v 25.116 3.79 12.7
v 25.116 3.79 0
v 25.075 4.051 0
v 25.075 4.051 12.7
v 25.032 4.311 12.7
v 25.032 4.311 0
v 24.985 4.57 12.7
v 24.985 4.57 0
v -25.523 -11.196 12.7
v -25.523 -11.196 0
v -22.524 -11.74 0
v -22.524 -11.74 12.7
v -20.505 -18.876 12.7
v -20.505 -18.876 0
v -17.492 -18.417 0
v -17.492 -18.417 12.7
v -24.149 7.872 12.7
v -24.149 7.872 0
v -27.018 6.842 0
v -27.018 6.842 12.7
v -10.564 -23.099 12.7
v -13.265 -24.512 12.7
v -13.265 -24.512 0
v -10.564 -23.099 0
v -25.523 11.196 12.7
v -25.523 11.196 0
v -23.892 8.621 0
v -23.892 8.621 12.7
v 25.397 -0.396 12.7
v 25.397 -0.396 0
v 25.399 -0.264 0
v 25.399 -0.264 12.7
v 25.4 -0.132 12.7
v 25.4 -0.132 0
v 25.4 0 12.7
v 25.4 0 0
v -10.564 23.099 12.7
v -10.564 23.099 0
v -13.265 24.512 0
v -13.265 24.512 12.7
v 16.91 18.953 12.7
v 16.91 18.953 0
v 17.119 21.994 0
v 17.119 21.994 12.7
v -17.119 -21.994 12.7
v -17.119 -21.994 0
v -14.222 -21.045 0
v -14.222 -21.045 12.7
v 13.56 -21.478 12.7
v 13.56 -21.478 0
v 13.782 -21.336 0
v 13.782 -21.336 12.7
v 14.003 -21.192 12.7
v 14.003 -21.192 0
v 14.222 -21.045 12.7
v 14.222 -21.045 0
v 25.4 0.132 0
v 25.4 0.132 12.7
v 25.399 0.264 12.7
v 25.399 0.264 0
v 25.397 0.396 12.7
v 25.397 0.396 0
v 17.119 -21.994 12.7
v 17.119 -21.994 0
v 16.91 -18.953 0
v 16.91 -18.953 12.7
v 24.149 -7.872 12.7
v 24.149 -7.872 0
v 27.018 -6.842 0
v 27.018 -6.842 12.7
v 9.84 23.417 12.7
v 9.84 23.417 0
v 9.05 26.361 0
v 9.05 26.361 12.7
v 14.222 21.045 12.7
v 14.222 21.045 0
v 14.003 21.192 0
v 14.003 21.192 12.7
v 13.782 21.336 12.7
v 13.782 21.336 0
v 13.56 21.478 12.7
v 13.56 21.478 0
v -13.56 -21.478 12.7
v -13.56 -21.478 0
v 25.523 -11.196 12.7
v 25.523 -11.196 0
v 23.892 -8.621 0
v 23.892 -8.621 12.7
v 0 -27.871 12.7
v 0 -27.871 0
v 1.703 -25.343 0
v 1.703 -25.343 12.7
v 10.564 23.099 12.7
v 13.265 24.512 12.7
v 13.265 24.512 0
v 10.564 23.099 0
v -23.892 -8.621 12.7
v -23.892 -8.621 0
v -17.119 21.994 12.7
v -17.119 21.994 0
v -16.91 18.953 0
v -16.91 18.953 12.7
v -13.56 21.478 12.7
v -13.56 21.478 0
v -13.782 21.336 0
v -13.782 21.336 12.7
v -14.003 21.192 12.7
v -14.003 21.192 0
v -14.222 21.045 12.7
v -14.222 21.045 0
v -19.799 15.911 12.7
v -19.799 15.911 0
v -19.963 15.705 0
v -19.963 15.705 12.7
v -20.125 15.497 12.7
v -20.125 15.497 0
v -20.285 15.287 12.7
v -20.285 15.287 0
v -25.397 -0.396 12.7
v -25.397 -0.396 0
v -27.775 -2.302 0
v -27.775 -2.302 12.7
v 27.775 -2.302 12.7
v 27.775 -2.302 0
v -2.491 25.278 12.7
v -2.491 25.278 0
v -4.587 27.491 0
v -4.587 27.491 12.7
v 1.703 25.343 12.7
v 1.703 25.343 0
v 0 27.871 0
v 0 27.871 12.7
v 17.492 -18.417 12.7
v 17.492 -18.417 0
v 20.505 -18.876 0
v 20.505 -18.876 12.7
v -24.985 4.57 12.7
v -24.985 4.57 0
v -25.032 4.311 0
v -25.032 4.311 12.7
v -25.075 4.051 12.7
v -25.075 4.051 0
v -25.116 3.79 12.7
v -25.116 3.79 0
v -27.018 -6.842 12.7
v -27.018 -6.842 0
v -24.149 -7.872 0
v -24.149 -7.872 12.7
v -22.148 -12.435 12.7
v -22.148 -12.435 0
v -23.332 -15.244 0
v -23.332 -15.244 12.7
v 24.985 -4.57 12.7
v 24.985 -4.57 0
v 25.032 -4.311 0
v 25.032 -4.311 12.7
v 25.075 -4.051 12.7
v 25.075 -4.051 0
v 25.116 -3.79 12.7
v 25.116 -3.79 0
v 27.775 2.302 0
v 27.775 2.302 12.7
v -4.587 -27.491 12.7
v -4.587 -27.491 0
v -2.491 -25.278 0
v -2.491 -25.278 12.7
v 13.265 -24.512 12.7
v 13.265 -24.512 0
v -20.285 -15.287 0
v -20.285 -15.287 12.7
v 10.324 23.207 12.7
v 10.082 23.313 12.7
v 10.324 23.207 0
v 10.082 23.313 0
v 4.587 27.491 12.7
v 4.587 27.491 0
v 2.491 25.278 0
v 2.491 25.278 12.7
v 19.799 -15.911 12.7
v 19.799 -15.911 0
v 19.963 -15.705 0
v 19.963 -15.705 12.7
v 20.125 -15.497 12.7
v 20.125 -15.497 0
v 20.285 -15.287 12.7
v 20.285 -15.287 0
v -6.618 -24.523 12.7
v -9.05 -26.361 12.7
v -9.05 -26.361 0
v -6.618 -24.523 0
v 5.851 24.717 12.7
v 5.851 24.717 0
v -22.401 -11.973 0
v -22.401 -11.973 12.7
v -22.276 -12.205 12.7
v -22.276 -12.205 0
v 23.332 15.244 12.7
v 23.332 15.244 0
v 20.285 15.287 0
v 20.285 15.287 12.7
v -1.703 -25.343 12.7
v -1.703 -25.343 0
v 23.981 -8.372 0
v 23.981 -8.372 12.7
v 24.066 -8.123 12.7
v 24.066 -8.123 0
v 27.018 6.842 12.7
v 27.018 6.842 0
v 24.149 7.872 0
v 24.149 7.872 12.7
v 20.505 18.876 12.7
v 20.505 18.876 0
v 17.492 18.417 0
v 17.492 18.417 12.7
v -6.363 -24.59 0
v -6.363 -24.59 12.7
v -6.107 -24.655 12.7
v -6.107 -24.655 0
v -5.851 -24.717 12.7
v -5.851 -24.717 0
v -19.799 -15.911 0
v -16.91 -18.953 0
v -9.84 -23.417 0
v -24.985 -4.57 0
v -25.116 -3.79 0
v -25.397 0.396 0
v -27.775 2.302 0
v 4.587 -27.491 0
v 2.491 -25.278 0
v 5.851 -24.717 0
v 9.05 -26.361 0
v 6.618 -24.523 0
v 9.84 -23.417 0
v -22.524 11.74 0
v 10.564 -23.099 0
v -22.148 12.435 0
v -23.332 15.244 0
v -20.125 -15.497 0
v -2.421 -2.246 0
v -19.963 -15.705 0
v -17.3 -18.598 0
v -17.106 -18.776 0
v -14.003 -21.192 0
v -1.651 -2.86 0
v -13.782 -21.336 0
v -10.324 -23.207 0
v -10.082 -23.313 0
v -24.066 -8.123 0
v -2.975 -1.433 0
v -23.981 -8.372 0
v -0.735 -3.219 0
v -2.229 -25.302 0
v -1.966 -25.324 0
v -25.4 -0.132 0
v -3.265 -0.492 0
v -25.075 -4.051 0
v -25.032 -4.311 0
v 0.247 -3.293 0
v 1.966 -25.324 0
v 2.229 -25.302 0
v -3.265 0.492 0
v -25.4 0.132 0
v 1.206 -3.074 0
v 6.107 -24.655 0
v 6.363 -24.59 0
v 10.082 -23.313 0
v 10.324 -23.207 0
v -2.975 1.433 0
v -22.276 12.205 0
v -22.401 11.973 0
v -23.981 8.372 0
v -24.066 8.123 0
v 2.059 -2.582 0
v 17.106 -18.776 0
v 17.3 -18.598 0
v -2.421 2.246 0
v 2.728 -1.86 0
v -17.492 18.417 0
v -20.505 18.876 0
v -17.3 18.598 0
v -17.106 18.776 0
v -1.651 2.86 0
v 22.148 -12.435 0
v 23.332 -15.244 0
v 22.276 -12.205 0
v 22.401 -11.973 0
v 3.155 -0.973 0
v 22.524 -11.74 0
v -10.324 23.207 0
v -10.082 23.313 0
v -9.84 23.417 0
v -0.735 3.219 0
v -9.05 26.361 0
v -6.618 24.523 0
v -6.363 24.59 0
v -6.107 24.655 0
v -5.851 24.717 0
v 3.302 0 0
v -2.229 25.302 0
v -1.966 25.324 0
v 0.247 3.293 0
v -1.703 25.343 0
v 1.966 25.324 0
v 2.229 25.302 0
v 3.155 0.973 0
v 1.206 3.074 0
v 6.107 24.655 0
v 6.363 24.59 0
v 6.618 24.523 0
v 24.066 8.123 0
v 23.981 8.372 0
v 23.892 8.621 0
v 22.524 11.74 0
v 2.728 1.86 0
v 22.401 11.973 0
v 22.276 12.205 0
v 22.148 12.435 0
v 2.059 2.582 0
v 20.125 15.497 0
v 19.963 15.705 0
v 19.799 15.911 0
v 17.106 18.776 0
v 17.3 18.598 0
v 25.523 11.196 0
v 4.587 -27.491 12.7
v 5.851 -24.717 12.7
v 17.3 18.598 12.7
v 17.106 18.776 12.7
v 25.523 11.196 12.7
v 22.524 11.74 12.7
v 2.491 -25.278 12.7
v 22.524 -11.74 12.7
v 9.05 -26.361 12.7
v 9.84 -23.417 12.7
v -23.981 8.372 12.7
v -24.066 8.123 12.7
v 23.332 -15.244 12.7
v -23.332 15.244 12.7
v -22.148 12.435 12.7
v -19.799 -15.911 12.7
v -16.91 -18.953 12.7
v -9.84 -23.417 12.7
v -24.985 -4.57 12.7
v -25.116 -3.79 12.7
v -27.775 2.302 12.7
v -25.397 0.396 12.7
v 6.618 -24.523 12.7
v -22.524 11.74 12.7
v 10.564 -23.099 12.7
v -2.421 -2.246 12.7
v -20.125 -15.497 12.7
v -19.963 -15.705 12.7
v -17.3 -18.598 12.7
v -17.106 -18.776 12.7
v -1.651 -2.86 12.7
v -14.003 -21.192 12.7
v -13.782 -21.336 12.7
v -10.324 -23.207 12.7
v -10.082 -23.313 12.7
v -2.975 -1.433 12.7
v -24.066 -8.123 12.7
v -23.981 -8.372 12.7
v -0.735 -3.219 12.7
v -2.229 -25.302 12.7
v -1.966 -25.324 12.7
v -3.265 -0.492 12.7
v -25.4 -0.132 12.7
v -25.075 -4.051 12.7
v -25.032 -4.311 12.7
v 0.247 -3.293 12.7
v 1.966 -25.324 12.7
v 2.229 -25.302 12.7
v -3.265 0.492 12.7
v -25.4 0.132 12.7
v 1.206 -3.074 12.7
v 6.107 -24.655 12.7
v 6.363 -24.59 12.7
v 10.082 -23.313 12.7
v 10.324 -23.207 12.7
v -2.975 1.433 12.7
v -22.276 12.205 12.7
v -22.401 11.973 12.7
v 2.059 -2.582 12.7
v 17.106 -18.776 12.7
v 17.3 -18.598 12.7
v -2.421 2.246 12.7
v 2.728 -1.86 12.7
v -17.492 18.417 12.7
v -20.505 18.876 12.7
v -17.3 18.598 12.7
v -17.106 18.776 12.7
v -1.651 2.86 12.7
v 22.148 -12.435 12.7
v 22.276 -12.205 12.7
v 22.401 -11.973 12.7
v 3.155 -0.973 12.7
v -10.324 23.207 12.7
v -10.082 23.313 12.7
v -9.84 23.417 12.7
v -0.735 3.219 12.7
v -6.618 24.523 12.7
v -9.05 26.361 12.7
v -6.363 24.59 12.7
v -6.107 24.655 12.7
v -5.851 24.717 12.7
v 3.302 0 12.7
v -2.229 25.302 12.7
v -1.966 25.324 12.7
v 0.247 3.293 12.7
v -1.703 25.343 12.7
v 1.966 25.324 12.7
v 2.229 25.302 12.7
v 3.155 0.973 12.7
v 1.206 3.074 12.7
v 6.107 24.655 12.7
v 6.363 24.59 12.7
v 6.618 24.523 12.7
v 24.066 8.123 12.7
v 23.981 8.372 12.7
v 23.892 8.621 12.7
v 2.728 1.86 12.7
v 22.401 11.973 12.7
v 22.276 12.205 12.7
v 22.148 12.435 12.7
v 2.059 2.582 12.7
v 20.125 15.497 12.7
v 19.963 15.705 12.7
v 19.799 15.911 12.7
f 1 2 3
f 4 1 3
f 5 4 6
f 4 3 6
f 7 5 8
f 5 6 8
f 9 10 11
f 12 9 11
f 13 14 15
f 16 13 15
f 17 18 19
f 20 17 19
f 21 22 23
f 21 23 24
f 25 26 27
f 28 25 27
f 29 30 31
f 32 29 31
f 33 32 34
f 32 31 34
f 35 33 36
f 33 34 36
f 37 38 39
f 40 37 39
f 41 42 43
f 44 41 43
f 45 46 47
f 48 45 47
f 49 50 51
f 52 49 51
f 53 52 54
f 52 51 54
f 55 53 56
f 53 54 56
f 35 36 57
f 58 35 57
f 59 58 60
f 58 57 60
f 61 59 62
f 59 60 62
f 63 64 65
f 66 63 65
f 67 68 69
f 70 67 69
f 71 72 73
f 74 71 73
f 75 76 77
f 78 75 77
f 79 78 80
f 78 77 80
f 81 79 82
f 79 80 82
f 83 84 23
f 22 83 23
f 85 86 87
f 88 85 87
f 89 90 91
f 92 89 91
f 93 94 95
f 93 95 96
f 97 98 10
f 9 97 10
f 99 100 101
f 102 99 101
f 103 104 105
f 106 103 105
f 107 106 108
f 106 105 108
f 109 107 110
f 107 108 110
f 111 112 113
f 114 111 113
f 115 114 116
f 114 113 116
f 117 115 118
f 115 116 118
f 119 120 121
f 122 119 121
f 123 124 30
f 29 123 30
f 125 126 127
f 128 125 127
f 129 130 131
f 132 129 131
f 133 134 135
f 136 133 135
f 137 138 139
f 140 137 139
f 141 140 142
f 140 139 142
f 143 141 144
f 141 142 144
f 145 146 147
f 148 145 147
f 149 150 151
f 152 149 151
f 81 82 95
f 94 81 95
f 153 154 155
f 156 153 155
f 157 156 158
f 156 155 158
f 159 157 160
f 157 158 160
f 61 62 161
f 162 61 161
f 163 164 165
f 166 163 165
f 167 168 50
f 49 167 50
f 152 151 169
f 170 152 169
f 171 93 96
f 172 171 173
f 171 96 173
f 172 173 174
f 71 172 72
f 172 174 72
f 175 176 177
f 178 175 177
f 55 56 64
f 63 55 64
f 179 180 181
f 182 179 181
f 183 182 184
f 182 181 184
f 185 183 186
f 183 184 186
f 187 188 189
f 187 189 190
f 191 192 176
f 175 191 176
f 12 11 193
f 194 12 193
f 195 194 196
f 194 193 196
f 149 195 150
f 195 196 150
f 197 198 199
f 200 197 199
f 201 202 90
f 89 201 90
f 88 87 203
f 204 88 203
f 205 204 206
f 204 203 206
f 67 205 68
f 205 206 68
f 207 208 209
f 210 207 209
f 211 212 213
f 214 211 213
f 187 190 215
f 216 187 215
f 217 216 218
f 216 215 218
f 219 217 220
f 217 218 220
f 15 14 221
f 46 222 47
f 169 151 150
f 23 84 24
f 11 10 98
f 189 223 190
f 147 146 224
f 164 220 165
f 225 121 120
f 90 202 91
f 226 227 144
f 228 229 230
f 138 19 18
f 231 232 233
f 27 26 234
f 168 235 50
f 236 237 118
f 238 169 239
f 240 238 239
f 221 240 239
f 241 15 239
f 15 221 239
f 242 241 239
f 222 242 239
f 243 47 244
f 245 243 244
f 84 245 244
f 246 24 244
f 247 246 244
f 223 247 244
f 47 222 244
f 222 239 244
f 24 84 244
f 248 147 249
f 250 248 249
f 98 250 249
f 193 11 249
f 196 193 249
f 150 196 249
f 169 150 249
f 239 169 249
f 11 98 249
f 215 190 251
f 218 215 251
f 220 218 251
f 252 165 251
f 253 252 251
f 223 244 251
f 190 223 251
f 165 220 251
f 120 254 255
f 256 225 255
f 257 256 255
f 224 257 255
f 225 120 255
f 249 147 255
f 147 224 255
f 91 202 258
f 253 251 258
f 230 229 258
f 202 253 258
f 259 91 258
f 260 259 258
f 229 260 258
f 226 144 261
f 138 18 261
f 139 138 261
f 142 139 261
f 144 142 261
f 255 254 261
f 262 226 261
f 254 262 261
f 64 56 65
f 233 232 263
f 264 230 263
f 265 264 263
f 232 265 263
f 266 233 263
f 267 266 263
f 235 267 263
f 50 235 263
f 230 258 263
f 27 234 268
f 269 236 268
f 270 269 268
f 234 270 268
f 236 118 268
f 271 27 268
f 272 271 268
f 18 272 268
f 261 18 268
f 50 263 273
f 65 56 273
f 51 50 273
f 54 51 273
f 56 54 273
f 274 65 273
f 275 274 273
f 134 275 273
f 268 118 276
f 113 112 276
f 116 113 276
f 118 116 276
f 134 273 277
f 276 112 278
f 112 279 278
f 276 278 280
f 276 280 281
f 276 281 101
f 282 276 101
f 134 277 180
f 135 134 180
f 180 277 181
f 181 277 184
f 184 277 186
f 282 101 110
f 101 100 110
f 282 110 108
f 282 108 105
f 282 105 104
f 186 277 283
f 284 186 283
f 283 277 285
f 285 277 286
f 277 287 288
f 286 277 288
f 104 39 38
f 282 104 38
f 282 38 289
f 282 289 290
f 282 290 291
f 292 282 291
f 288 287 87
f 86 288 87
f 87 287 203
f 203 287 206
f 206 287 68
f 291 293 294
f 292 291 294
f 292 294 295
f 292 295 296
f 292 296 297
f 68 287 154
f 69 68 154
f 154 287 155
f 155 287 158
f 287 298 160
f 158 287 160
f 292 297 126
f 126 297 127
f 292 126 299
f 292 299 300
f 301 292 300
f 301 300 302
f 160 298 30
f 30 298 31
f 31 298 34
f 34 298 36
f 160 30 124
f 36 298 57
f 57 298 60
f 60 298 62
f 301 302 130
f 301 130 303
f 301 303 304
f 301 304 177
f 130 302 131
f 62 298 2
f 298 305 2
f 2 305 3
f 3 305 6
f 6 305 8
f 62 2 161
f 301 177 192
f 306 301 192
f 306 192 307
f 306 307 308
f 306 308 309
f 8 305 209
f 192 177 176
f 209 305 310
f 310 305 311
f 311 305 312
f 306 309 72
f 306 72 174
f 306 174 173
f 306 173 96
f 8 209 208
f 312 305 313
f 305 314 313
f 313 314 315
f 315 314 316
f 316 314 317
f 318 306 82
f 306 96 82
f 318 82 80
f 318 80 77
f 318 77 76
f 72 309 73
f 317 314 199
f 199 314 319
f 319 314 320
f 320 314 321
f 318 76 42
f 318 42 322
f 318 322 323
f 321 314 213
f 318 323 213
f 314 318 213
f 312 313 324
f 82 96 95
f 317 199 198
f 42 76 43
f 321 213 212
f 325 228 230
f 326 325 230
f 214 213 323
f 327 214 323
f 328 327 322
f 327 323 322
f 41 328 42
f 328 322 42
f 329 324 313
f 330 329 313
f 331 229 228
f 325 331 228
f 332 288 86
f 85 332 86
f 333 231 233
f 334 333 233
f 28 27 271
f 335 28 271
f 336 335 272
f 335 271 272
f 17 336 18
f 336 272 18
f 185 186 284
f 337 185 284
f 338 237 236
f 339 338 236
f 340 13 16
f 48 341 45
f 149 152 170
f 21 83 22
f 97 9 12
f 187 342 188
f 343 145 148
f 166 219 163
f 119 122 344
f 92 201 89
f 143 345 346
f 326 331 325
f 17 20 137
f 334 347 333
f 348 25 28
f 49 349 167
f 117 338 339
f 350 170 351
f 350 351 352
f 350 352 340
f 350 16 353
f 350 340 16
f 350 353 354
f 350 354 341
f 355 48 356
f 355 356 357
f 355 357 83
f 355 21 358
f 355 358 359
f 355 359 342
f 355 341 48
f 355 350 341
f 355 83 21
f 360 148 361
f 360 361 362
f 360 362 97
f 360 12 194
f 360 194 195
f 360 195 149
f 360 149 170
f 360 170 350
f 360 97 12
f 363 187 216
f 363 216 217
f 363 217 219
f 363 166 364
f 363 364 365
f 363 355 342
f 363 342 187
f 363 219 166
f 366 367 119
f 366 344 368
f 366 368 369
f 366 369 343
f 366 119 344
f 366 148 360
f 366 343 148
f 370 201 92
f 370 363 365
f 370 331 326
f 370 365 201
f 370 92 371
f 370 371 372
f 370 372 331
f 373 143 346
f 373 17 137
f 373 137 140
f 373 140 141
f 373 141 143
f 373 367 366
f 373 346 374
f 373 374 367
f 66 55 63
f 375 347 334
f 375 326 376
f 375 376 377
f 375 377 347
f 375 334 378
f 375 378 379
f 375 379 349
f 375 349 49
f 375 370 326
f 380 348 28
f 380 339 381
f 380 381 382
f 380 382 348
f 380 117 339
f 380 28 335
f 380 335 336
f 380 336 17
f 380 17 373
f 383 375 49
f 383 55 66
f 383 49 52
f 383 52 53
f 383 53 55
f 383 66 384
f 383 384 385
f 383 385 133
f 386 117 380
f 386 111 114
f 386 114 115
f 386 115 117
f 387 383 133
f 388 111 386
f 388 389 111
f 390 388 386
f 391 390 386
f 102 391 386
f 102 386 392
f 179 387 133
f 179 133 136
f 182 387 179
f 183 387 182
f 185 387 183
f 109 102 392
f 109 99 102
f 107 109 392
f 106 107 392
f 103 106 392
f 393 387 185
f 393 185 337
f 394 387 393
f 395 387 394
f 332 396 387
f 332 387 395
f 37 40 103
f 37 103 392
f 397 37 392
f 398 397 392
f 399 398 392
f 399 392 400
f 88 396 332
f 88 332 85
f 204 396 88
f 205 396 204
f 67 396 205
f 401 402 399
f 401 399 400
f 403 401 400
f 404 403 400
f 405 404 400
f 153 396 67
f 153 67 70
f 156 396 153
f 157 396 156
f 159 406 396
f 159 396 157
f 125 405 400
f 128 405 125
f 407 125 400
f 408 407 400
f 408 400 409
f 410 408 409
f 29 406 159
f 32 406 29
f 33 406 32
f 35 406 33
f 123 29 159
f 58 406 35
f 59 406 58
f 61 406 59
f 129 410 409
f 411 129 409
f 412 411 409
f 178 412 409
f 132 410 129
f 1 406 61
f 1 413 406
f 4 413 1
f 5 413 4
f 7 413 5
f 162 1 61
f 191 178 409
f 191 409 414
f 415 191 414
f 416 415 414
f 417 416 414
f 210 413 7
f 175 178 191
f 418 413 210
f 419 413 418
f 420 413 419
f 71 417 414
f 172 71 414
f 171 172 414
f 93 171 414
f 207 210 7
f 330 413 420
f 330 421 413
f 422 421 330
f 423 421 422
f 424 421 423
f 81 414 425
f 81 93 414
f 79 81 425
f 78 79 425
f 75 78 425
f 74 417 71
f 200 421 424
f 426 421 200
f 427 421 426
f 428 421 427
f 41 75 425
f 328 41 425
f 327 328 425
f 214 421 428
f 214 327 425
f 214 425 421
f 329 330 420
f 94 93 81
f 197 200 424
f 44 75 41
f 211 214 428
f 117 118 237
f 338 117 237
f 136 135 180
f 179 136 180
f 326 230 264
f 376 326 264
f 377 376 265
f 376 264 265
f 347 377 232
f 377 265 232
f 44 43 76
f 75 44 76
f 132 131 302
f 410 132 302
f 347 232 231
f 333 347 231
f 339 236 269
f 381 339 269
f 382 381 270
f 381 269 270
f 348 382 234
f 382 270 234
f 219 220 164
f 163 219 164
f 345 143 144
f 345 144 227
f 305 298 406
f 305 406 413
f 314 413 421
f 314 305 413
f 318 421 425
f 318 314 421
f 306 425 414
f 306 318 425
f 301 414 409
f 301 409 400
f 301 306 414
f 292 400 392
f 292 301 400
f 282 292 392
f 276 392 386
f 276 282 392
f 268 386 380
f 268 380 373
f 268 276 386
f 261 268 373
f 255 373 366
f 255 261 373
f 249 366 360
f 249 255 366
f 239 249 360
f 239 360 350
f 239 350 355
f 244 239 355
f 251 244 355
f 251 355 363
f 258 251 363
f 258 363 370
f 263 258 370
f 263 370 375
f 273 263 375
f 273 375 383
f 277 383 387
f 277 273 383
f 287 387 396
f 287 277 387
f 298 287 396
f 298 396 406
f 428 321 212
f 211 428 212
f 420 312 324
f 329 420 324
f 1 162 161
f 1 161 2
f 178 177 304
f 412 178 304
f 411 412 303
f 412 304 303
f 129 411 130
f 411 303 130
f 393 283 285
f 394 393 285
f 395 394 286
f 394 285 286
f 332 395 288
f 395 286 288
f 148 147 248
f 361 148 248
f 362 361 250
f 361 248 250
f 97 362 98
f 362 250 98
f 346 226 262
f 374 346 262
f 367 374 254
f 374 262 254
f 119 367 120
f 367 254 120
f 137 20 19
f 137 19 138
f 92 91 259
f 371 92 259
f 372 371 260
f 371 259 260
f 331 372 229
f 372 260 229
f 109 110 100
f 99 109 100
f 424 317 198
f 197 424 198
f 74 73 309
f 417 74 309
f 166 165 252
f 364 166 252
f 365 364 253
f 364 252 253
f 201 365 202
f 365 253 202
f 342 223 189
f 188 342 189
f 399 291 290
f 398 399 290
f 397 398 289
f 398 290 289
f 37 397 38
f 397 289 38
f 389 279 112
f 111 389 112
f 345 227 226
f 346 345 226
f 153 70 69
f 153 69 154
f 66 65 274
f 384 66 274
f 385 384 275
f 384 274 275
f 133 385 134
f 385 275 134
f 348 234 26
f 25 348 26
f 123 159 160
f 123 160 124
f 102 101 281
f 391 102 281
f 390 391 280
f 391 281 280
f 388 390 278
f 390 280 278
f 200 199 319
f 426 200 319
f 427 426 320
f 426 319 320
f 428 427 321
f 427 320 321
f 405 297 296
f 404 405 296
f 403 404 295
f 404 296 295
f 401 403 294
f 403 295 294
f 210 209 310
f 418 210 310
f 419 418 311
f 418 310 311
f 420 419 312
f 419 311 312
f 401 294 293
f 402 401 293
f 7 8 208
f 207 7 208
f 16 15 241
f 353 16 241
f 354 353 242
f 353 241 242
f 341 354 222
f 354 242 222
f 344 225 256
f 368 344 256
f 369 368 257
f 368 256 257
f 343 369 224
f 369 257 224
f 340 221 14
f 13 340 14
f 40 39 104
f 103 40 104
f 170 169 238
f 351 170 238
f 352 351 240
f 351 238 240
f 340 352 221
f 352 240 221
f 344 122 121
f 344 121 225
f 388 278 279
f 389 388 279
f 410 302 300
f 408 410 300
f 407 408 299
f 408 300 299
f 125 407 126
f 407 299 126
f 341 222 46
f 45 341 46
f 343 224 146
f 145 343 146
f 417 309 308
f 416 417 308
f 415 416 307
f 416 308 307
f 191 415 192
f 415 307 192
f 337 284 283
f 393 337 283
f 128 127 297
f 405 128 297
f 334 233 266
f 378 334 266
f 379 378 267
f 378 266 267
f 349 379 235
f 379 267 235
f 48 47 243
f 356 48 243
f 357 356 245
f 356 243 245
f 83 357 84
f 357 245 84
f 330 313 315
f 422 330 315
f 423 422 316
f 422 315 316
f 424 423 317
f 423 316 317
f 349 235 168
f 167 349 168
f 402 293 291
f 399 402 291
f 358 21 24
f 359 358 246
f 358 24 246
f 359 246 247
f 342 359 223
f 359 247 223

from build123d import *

# Parameters (mm, degrees)
F0_R     = 3.302
F1_DEPTH = 12.7


with BuildPart() as f1:
    # F0 (on Top) → F1 (new body)
    with BuildSketch(Plane.XY):
        with BuildLine():
            ThreePointArc((25.39692, -0.395572), (25.39923, -0.197792), (25.4, 0))
            ThreePointArc((25.4, 0), (25.39923, 0.197792), (25.39692, 0.395572))
            ThreePointArc((25.39692, 0.395572), (25.313246, 2.097515), (25.115648, 3.790019))
            ThreePointArc((25.115648, 3.790019), (25.053577, 4.180703), (24.98543, 4.570373))
            ThreePointArc((24.98543, 4.570373), (24.622767, 6.235331), (24.149286, 7.872227))
            ThreePointArc((24.149286, 7.872227), (24.023758, 8.247367), (23.892402, 8.620505))
            ThreePointArc((23.892402, 8.620505), (23.260642, 10.203064), (22.524196, 11.739702))
            ThreePointArc((22.524196, 11.739702), (22.338633, 12.089064), (22.147653, 12.435493))
            ThreePointArc((22.147653, 12.435493), (21.264029, 13.892483), (20.284703, 15.286949))
            ThreePointArc((20.284703, 15.286949), (20.044169, 15.601003), (19.798773, 15.911273))
            ThreePointArc((19.798773, 15.911273), (18.687387, 17.202952), (17.491897, 18.417207))
            ThreePointArc((17.491897, 18.417207), (17.202952, 18.687387), (16.909834, 18.953035))
            ThreePointArc((16.909834, 18.953035), (15.601003, 20.044169), (14.221958, 21.045092))
            ThreePointArc((14.221958, 21.045092), (13.892483, 21.264029), (13.559639, 21.477807))
            ThreePointArc((13.559639, 21.477807), (12.089064, 22.338633), (10.564081, 23.098922))
            ThreePointArc((10.564081, 23.098922), (10.203064, 23.260642), (9.839572, 23.416721))
            ThreePointArc((9.839572, 23.416721), (8.247367, 24.023758), (6.618043, 24.522673))
            ThreePointArc((6.618043, 24.522673), (6.235331, 24.622767), (5.851107, 24.716888))
            ThreePointArc((5.851107, 24.716888), (4.180703, 25.053577), (2.491482, 25.27751))
            ThreePointArc((2.491482, 25.27751), (2.097515, 25.313246), (1.70304, 25.342842))
            ThreePointArc((1.70304, 25.342842), (0, 25.4), (-1.70304, 25.342842))
            ThreePointArc((-1.70304, 25.342842), (-2.097515, 25.313246), (-2.491482, 25.27751))
            ThreePointArc((-2.491482, 25.27751), (-4.180703, 25.053577), (-5.851107, 24.716888))
            ThreePointArc((-5.851107, 24.716888), (-6.235331, 24.622767), (-6.618043, 24.522673))
            ThreePointArc((-6.618043, 24.522673), (-8.247367, 24.023758), (-9.839572, 23.416721))
            ThreePointArc((-9.839572, 23.416721), (-10.203064, 23.260642), (-10.564081, 23.098922))
            ThreePointArc((-10.564081, 23.098922), (-12.089064, 22.338633), (-13.559639, 21.477807))
            ThreePointArc((-13.559639, 21.477807), (-13.892483, 21.264029), (-14.221958, 21.045092))
            ThreePointArc((-14.221958, 21.045092), (-15.601003, 20.044169), (-16.909834, 18.953035))
            ThreePointArc((-16.909834, 18.953035), (-17.202952, 18.687387), (-17.491897, 18.417207))
            ThreePointArc((-17.491897, 18.417207), (-18.687387, 17.202952), (-19.798773, 15.911273))
            ThreePointArc((-19.798773, 15.911273), (-20.044169, 15.601003), (-20.284703, 15.286949))
            ThreePointArc((-20.284703, 15.286949), (-21.264029, 13.892483), (-22.147653, 12.435493))
            ThreePointArc((-22.147653, 12.435493), (-22.338633, 12.089064), (-22.524196, 11.739702))
            ThreePointArc((-22.524196, 11.739702), (-23.260642, 10.203064), (-23.892402, 8.620505))
            ThreePointArc((-23.892402, 8.620505), (-24.023758, 8.247367), (-24.149286, 7.872227))
            ThreePointArc((-24.149286, 7.872227), (-24.622767, 6.235331), (-24.98543, 4.570373))
            ThreePointArc((-24.98543, 4.570373), (-25.053577, 4.180703), (-25.115648, 3.790019))
            ThreePointArc((-25.115648, 3.790019), (-25.313246, 2.097515), (-25.39692, 0.395572))
            ThreePointArc((-25.39692, 0.395572), (-25.4, 0), (-25.39692, -0.395572))
            ThreePointArc((-25.39692, -0.395572), (-25.313246, -2.097515), (-25.115648, -3.790019))
            ThreePointArc((-25.115648, -3.790019), (-25.053577, -4.180703), (-24.98543, -4.570373))
            ThreePointArc((-24.98543, -4.570373), (-24.622767, -6.235331), (-24.149286, -7.872227))
            ThreePointArc((-24.149286, -7.872227), (-24.023758, -8.247367), (-23.892402, -8.620505))
            ThreePointArc((-23.892402, -8.620505), (-23.260642, -10.203064), (-22.524196, -11.739702))
            ThreePointArc((-22.524196, -11.739702), (-22.338633, -12.089064), (-22.147653, -12.435493))
            ThreePointArc((-22.147653, -12.435493), (-21.264029, -13.892483), (-20.284703, -15.286949))
            ThreePointArc((-20.284703, -15.286949), (-20.044169, -15.601003), (-19.798773, -15.911273))
            ThreePointArc((-19.798773, -15.911273), (-18.687387, -17.202952), (-17.491897, -18.417207))
            ThreePointArc((-17.491897, -18.417207), (-17.202952, -18.687387), (-16.909834, -18.953035))
            ThreePointArc((-16.909834, -18.953035), (-15.601003, -20.044169), (-14.221958, -21.045092))
            ThreePointArc((-14.221958, -21.045092), (-13.892483, -21.264029), (-13.559639, -21.477807))
            ThreePointArc((-13.559639, -21.477807), (-12.089064, -22.338633), (-10.564081, -23.098922))
            ThreePointArc((-10.564081, -23.098922), (-10.203064, -23.260642), (-9.839572, -23.416721))
            ThreePointArc((-9.839572, -23.416721), (-8.247367, -24.023758), (-6.618043, -24.522673))
            ThreePointArc((-6.618043, -24.522673), (-6.235331, -24.622767), (-5.851107, -24.716888))
            ThreePointArc((-5.851107, -24.716888), (-4.180703, -25.053577), (-2.491482, -25.27751))
            ThreePointArc((-2.491482, -25.27751), (-2.097515, -25.313246), (-1.70304, -25.342842))
            ThreePointArc((-1.70304, -25.342842), (0, -25.4), (1.70304, -25.342842))
            ThreePointArc((1.70304, -25.342842), (2.097515, -25.313246), (2.491482, -25.27751))
            ThreePointArc((2.491482, -25.27751), (4.180703, -25.053577), (5.851107, -24.716888))
            ThreePointArc((5.851107, -24.716888), (6.235331, -24.622767), (6.618043, -24.522673))
            ThreePointArc((6.618043, -24.522673), (8.247367, -24.023758), (9.839572, -23.416721))
            ThreePointArc((9.839572, -23.416721), (10.203064, -23.260642), (10.564081, -23.098922))
            ThreePointArc((10.564081, -23.098922), (12.089064, -22.338633), (13.559639, -21.477807))
            ThreePointArc((13.559639, -21.477807), (13.892483, -21.264029), (14.221958, -21.045092))
            ThreePointArc((14.221958, -21.045092), (15.601003, -20.044169), (16.909834, -18.953035))
            ThreePointArc((16.909834, -18.953035), (17.202952, -18.687387), (17.491897, -18.417207))
            ThreePointArc((17.491897, -18.417207), (18.687387, -17.202952), (19.798773, -15.911273))
            ThreePointArc((19.798773, -15.911273), (20.044169, -15.601003), (20.284703, -15.286949))
            ThreePointArc((20.284703, -15.286949), (21.264029, -13.892483), (22.147653, -12.435493))
            ThreePointArc((22.147653, -12.435493), (22.338633, -12.089064), (22.524196, -11.739702))
            ThreePointArc((22.524196, -11.739702), (23.260642, -10.203064), (23.892402, -8.620505))
            ThreePointArc((23.892402, -8.620505), (24.023758, -8.247367), (24.149286, -7.872227))
            ThreePointArc((24.149286, -7.872227), (24.622767, -6.235331), (24.98543, -4.570373))
            ThreePointArc((24.98543, -4.570373), (25.053577, -4.180703), (25.115648, -3.790019))
            ThreePointArc((25.115648, -3.790019), (25.313246, -2.097515), (25.39692, -0.395572))
        make_face()
        Circle(F0_R, mode=Mode.SUBTRACT)
        with BuildLine():
            Line((-27.775487, -2.301542), (-25.115648, -3.790019))
            ThreePointArc((-25.115648, -3.790019), (-25.313246, -2.097515), (-25.39692, -0.395572))
            Line((-25.39692, -0.395572), (-27.775487, -2.301542))
        make_face()
        with BuildLine():
            Line((25.523225, -11.195524), (23.892402, -8.620505))
            ThreePointArc((23.892402, -8.620505), (23.260642, -10.203064), (22.524196, -11.739702))
            Line((22.524196, -11.739702), (25.523225, -11.195524))
        make_face()
        with BuildLine():
            Line((-9.049595, -26.360569), (-6.618043, -24.522673))
            ThreePointArc((-6.618043, -24.522673), (-8.247367, -24.023758), (-9.839572, -23.416721))
            Line((-9.839572, -23.416721), (-9.049595, -26.360569))
        make_face()
        with BuildLine():
            Line((-27.017844, -6.841847), (-24.149286, -7.872227))
            ThreePointArc((-24.149286, -7.872227), (-24.622767, -6.235331), (-24.98543, -4.570373))
            Line((-24.98543, -4.570373), (-27.017844, -6.841847))
        make_face()
        with BuildLine():
            Line((4.587363, -27.490559), (5.851107, -24.716888))
            ThreePointArc((5.851107, -24.716888), (4.180703, -25.053577), (2.491482, -25.27751))
            Line((2.491482, -25.27751), (4.587363, -27.490559))
        make_face()
        with BuildLine():
            Line((27.017844, -6.841847), (24.98543, -4.570373))
            ThreePointArc((24.98543, -4.570373), (24.622767, -6.235331), (24.149286, -7.872227))
            Line((24.149286, -7.872227), (27.017844, -6.841847))
        make_face()
        with BuildLine():
            Line((-4.587363, -27.490559), (-2.491482, -25.27751))
            ThreePointArc((-2.491482, -25.27751), (-4.180703, -25.053577), (-5.851107, -24.716888))
            Line((-5.851107, -24.716888), (-4.587363, -27.490559))
        make_face()
        with BuildLine():
            Line((-25.523225, -11.195524), (-22.524196, -11.739702))
            ThreePointArc((-22.524196, -11.739702), (-23.260642, -10.203064), (-23.892402, -8.620505))
            Line((-23.892402, -8.620505), (-25.523225, -11.195524))
        make_face()
        with BuildLine():
            Line((27.775487, -2.301542), (25.39692, -0.395572))
            ThreePointArc((25.39692, -0.395572), (25.313246, -2.097515), (25.115648, -3.790019))
            Line((25.115648, -3.790019), (27.775487, -2.301542))
        make_face()
        with BuildLine():
            Line((9.049595, -26.360569), (9.839572, -23.416721))
            ThreePointArc((9.839572, -23.416721), (8.247367, -24.023758), (6.618043, -24.522673))
            Line((6.618043, -24.522673), (9.049595, -26.360569))
        make_face()
        with BuildLine():
            Line((0, -27.870679), (1.70304, -25.342842))
            ThreePointArc((1.70304, -25.342842), (0, -25.4), (-1.70304, -25.342842))
            Line((-1.70304, -25.342842), (0, -27.870679))
        make_face()
        with BuildLine():
            Line((-23.332398, -15.243817), (-20.284703, -15.286949))
            ThreePointArc((-20.284703, -15.286949), (-21.264029, -13.892483), (-22.147653, -12.435493))
            Line((-22.147653, -12.435493), (-23.332398, -15.243817))
        make_face()
        with BuildLine():
            ThreePointArc((-22.147653, 12.435493), (-21.264029, 13.892483), (-20.284703, 15.286949))
            Line((-20.284703, 15.286949), (-23.332398, 15.243817))
            Line((-23.332398, 15.243817), (-22.147653, 12.435493))
        make_face()
        with BuildLine():
            ThreePointArc((-16.909834, 18.953035), (-15.601003, 20.044169), (-14.221958, 21.045092))
            Line((-14.221958, 21.045092), (-17.118525, 21.993882))
            Line((-17.118525, 21.993882), (-16.909834, 18.953035))
        make_face()
        with BuildLine():
            ThreePointArc((-19.798773, 15.911273), (-18.687387, 17.202952), (-17.491897, 18.417207))
            Line((-17.491897, 18.417207), (-20.505125, 18.876297))
            Line((-20.505125, 18.876297), (-19.798773, 15.911273))
        make_face()
        with BuildLine():
            ThreePointArc((-23.892402, 8.620505), (-23.260642, 10.203064), (-22.524196, 11.739702))
            Line((-22.524196, 11.739702), (-25.523225, 11.195524))
            Line((-25.523225, 11.195524), (-23.892402, 8.620505))
        make_face()
        with BuildLine():
            Line((17.118525, -21.993882), (16.909834, -18.953035))
            ThreePointArc((16.909834, -18.953035), (15.601003, -20.044169), (14.221958, -21.045092))
            Line((14.221958, -21.045092), (17.118525, -21.993882))
        make_face()
        with BuildLine():
            ThreePointArc((25.115648, 3.790019), (25.313246, 2.097515), (25.39692, 0.395572))
            Line((25.39692, 0.395572), (27.775487, 2.301542))
            Line((27.775487, 2.301542), (25.115648, 3.790019))
        make_face()
        with BuildLine():
            ThreePointArc((24.149286, 7.872227), (24.622767, 6.235331), (24.98543, 4.570373))
            Line((24.98543, 4.570373), (27.017844, 6.841847))
            Line((27.017844, 6.841847), (24.149286, 7.872227))
        make_face()
        with BuildLine():
            ThreePointArc((22.524196, 11.739702), (23.260642, 10.203064), (23.892402, 8.620505))
            Line((23.892402, 8.620505), (25.523225, 11.195524))
            Line((25.523225, 11.195524), (22.524196, 11.739702))
        make_face()
        with BuildLine():
            ThreePointArc((20.284703, 15.286949), (21.264029, 13.892483), (22.147653, 12.435493))
            Line((22.147653, 12.435493), (23.332398, 15.243817))
            Line((23.332398, 15.243817), (20.284703, 15.286949))
        make_face()
        with BuildLine():
            ThreePointArc((17.491897, 18.417207), (18.687387, 17.202952), (19.798773, 15.911273))
            Line((19.798773, 15.911273), (20.505125, 18.876297))
            Line((20.505125, 18.876297), (17.491897, 18.417207))
        make_face()
        with BuildLine():
            ThreePointArc((14.221958, 21.045092), (15.601003, 20.044169), (16.909834, 18.953035))
            Line((16.909834, 18.953035), (17.118525, 21.993882))
            Line((17.118525, 21.993882), (14.221958, 21.045092))
        make_face()
        with BuildLine():
            ThreePointArc((10.564081, 23.098922), (12.089064, 22.338633), (13.559639, 21.477807))
            Line((13.559639, 21.477807), (13.264977, 24.511531))
            Line((13.264977, 24.511531), (10.564081, 23.098922))
        make_face()
        with BuildLine():
            ThreePointArc((6.618043, 24.522673), (8.247367, 24.023758), (9.839572, 23.416721))
            Line((9.839572, 23.416721), (9.049595, 26.360569))
            Line((9.049595, 26.360569), (6.618043, 24.522673))
        make_face()
        with BuildLine():
            ThreePointArc((2.491482, 25.27751), (4.180703, 25.053577), (5.851107, 24.716888))
            Line((5.851107, 24.716888), (4.587363, 27.490559))
            Line((4.587363, 27.490559), (2.491482, 25.27751))
        make_face()
        with BuildLine():
            ThreePointArc((-1.70304, 25.342842), (0, 25.4), (1.70304, 25.342842))
            Line((1.70304, 25.342842), (0, 27.870679))
            Line((0, 27.870679), (-1.70304, 25.342842))
        make_face()
        with BuildLine():
            ThreePointArc((-5.851107, 24.716888), (-4.180703, 25.053577), (-2.491482, 25.27751))
            Line((-2.491482, 25.27751), (-4.587363, 27.490559))
            Line((-4.587363, 27.490559), (-5.851107, 24.716888))
        make_face()
        with BuildLine():
            ThreePointArc((-9.839572, 23.416721), (-8.247367, 24.023758), (-6.618043, 24.522673))
            Line((-6.618043, 24.522673), (-9.049595, 26.360569))
            Line((-9.049595, 26.360569), (-9.839572, 23.416721))
        make_face()
        with BuildLine():
            ThreePointArc((-13.559639, 21.477807), (-12.089064, 22.338633), (-10.564081, 23.098922))
            Line((-10.564081, 23.098922), (-13.264977, 24.511531))
            Line((-13.264977, 24.511531), (-13.559639, 21.477807))
        make_face()
        with BuildLine():
            Line((-20.505125, -18.876297), (-17.491897, -18.417207))
            ThreePointArc((-17.491897, -18.417207), (-18.687387, -17.202952), (-19.798773, -15.911273))
            Line((-19.798773, -15.911273), (-20.505125, -18.876297))
        make_face()
        with BuildLine():
            ThreePointArc((-24.98543, 4.570373), (-24.622767, 6.235331), (-24.149286, 7.872227))
            Line((-24.149286, 7.872227), (-27.017844, 6.841847))
            Line((-27.017844, 6.841847), (-24.98543, 4.570373))
        make_face()
        with BuildLine():
            Line((20.505125, -18.876297), (19.798773, -15.911273))
            ThreePointArc((19.798773, -15.911273), (18.687387, -17.202952), (17.491897, -18.417207))
            Line((17.491897, -18.417207), (20.505125, -18.876297))
        make_face()
        with BuildLine():
            Line((-17.118525, -21.993882), (-14.221958, -21.045092))
            ThreePointArc((-14.221958, -21.045092), (-15.601003, -20.044169), (-16.909834, -18.953035))
            Line((-16.909834, -18.953035), (-17.118525, -21.993882))
        make_face()
        with BuildLine():
            ThreePointArc((-25.39692, 0.395572), (-25.313246, 2.097515), (-25.115648, 3.790019))
            Line((-25.115648, 3.790019), (-27.775487, 2.301542))
            Line((-27.775487, 2.301542), (-25.39692, 0.395572))
        make_face()
        with BuildLine():
            Line((23.332398, -15.243817), (22.147653, -12.435493))
            ThreePointArc((22.147653, -12.435493), (21.264029, -13.892483), (20.284703, -15.286949))
            Line((20.284703, -15.286949), (23.332398, -15.243817))
        make_face()
        with BuildLine():
            Line((13.264977, -24.511531), (13.559639, -21.477807))
            ThreePointArc((13.559639, -21.477807), (12.089064, -22.338633), (10.564081, -23.098922))
            Line((10.564081, -23.098922), (13.264977, -24.511531))
        make_face()
        with BuildLine():
            Line((-13.264977, -24.511531), (-10.564081, -23.098922))
            ThreePointArc((-10.564081, -23.098922), (-12.089064, -22.338633), (-13.559639, -21.477807))
            Line((-13.559639, -21.477807), (-13.264977, -24.511531))
        make_face()
    extrude(amount=F1_DEPTH)


solid = f1.part
